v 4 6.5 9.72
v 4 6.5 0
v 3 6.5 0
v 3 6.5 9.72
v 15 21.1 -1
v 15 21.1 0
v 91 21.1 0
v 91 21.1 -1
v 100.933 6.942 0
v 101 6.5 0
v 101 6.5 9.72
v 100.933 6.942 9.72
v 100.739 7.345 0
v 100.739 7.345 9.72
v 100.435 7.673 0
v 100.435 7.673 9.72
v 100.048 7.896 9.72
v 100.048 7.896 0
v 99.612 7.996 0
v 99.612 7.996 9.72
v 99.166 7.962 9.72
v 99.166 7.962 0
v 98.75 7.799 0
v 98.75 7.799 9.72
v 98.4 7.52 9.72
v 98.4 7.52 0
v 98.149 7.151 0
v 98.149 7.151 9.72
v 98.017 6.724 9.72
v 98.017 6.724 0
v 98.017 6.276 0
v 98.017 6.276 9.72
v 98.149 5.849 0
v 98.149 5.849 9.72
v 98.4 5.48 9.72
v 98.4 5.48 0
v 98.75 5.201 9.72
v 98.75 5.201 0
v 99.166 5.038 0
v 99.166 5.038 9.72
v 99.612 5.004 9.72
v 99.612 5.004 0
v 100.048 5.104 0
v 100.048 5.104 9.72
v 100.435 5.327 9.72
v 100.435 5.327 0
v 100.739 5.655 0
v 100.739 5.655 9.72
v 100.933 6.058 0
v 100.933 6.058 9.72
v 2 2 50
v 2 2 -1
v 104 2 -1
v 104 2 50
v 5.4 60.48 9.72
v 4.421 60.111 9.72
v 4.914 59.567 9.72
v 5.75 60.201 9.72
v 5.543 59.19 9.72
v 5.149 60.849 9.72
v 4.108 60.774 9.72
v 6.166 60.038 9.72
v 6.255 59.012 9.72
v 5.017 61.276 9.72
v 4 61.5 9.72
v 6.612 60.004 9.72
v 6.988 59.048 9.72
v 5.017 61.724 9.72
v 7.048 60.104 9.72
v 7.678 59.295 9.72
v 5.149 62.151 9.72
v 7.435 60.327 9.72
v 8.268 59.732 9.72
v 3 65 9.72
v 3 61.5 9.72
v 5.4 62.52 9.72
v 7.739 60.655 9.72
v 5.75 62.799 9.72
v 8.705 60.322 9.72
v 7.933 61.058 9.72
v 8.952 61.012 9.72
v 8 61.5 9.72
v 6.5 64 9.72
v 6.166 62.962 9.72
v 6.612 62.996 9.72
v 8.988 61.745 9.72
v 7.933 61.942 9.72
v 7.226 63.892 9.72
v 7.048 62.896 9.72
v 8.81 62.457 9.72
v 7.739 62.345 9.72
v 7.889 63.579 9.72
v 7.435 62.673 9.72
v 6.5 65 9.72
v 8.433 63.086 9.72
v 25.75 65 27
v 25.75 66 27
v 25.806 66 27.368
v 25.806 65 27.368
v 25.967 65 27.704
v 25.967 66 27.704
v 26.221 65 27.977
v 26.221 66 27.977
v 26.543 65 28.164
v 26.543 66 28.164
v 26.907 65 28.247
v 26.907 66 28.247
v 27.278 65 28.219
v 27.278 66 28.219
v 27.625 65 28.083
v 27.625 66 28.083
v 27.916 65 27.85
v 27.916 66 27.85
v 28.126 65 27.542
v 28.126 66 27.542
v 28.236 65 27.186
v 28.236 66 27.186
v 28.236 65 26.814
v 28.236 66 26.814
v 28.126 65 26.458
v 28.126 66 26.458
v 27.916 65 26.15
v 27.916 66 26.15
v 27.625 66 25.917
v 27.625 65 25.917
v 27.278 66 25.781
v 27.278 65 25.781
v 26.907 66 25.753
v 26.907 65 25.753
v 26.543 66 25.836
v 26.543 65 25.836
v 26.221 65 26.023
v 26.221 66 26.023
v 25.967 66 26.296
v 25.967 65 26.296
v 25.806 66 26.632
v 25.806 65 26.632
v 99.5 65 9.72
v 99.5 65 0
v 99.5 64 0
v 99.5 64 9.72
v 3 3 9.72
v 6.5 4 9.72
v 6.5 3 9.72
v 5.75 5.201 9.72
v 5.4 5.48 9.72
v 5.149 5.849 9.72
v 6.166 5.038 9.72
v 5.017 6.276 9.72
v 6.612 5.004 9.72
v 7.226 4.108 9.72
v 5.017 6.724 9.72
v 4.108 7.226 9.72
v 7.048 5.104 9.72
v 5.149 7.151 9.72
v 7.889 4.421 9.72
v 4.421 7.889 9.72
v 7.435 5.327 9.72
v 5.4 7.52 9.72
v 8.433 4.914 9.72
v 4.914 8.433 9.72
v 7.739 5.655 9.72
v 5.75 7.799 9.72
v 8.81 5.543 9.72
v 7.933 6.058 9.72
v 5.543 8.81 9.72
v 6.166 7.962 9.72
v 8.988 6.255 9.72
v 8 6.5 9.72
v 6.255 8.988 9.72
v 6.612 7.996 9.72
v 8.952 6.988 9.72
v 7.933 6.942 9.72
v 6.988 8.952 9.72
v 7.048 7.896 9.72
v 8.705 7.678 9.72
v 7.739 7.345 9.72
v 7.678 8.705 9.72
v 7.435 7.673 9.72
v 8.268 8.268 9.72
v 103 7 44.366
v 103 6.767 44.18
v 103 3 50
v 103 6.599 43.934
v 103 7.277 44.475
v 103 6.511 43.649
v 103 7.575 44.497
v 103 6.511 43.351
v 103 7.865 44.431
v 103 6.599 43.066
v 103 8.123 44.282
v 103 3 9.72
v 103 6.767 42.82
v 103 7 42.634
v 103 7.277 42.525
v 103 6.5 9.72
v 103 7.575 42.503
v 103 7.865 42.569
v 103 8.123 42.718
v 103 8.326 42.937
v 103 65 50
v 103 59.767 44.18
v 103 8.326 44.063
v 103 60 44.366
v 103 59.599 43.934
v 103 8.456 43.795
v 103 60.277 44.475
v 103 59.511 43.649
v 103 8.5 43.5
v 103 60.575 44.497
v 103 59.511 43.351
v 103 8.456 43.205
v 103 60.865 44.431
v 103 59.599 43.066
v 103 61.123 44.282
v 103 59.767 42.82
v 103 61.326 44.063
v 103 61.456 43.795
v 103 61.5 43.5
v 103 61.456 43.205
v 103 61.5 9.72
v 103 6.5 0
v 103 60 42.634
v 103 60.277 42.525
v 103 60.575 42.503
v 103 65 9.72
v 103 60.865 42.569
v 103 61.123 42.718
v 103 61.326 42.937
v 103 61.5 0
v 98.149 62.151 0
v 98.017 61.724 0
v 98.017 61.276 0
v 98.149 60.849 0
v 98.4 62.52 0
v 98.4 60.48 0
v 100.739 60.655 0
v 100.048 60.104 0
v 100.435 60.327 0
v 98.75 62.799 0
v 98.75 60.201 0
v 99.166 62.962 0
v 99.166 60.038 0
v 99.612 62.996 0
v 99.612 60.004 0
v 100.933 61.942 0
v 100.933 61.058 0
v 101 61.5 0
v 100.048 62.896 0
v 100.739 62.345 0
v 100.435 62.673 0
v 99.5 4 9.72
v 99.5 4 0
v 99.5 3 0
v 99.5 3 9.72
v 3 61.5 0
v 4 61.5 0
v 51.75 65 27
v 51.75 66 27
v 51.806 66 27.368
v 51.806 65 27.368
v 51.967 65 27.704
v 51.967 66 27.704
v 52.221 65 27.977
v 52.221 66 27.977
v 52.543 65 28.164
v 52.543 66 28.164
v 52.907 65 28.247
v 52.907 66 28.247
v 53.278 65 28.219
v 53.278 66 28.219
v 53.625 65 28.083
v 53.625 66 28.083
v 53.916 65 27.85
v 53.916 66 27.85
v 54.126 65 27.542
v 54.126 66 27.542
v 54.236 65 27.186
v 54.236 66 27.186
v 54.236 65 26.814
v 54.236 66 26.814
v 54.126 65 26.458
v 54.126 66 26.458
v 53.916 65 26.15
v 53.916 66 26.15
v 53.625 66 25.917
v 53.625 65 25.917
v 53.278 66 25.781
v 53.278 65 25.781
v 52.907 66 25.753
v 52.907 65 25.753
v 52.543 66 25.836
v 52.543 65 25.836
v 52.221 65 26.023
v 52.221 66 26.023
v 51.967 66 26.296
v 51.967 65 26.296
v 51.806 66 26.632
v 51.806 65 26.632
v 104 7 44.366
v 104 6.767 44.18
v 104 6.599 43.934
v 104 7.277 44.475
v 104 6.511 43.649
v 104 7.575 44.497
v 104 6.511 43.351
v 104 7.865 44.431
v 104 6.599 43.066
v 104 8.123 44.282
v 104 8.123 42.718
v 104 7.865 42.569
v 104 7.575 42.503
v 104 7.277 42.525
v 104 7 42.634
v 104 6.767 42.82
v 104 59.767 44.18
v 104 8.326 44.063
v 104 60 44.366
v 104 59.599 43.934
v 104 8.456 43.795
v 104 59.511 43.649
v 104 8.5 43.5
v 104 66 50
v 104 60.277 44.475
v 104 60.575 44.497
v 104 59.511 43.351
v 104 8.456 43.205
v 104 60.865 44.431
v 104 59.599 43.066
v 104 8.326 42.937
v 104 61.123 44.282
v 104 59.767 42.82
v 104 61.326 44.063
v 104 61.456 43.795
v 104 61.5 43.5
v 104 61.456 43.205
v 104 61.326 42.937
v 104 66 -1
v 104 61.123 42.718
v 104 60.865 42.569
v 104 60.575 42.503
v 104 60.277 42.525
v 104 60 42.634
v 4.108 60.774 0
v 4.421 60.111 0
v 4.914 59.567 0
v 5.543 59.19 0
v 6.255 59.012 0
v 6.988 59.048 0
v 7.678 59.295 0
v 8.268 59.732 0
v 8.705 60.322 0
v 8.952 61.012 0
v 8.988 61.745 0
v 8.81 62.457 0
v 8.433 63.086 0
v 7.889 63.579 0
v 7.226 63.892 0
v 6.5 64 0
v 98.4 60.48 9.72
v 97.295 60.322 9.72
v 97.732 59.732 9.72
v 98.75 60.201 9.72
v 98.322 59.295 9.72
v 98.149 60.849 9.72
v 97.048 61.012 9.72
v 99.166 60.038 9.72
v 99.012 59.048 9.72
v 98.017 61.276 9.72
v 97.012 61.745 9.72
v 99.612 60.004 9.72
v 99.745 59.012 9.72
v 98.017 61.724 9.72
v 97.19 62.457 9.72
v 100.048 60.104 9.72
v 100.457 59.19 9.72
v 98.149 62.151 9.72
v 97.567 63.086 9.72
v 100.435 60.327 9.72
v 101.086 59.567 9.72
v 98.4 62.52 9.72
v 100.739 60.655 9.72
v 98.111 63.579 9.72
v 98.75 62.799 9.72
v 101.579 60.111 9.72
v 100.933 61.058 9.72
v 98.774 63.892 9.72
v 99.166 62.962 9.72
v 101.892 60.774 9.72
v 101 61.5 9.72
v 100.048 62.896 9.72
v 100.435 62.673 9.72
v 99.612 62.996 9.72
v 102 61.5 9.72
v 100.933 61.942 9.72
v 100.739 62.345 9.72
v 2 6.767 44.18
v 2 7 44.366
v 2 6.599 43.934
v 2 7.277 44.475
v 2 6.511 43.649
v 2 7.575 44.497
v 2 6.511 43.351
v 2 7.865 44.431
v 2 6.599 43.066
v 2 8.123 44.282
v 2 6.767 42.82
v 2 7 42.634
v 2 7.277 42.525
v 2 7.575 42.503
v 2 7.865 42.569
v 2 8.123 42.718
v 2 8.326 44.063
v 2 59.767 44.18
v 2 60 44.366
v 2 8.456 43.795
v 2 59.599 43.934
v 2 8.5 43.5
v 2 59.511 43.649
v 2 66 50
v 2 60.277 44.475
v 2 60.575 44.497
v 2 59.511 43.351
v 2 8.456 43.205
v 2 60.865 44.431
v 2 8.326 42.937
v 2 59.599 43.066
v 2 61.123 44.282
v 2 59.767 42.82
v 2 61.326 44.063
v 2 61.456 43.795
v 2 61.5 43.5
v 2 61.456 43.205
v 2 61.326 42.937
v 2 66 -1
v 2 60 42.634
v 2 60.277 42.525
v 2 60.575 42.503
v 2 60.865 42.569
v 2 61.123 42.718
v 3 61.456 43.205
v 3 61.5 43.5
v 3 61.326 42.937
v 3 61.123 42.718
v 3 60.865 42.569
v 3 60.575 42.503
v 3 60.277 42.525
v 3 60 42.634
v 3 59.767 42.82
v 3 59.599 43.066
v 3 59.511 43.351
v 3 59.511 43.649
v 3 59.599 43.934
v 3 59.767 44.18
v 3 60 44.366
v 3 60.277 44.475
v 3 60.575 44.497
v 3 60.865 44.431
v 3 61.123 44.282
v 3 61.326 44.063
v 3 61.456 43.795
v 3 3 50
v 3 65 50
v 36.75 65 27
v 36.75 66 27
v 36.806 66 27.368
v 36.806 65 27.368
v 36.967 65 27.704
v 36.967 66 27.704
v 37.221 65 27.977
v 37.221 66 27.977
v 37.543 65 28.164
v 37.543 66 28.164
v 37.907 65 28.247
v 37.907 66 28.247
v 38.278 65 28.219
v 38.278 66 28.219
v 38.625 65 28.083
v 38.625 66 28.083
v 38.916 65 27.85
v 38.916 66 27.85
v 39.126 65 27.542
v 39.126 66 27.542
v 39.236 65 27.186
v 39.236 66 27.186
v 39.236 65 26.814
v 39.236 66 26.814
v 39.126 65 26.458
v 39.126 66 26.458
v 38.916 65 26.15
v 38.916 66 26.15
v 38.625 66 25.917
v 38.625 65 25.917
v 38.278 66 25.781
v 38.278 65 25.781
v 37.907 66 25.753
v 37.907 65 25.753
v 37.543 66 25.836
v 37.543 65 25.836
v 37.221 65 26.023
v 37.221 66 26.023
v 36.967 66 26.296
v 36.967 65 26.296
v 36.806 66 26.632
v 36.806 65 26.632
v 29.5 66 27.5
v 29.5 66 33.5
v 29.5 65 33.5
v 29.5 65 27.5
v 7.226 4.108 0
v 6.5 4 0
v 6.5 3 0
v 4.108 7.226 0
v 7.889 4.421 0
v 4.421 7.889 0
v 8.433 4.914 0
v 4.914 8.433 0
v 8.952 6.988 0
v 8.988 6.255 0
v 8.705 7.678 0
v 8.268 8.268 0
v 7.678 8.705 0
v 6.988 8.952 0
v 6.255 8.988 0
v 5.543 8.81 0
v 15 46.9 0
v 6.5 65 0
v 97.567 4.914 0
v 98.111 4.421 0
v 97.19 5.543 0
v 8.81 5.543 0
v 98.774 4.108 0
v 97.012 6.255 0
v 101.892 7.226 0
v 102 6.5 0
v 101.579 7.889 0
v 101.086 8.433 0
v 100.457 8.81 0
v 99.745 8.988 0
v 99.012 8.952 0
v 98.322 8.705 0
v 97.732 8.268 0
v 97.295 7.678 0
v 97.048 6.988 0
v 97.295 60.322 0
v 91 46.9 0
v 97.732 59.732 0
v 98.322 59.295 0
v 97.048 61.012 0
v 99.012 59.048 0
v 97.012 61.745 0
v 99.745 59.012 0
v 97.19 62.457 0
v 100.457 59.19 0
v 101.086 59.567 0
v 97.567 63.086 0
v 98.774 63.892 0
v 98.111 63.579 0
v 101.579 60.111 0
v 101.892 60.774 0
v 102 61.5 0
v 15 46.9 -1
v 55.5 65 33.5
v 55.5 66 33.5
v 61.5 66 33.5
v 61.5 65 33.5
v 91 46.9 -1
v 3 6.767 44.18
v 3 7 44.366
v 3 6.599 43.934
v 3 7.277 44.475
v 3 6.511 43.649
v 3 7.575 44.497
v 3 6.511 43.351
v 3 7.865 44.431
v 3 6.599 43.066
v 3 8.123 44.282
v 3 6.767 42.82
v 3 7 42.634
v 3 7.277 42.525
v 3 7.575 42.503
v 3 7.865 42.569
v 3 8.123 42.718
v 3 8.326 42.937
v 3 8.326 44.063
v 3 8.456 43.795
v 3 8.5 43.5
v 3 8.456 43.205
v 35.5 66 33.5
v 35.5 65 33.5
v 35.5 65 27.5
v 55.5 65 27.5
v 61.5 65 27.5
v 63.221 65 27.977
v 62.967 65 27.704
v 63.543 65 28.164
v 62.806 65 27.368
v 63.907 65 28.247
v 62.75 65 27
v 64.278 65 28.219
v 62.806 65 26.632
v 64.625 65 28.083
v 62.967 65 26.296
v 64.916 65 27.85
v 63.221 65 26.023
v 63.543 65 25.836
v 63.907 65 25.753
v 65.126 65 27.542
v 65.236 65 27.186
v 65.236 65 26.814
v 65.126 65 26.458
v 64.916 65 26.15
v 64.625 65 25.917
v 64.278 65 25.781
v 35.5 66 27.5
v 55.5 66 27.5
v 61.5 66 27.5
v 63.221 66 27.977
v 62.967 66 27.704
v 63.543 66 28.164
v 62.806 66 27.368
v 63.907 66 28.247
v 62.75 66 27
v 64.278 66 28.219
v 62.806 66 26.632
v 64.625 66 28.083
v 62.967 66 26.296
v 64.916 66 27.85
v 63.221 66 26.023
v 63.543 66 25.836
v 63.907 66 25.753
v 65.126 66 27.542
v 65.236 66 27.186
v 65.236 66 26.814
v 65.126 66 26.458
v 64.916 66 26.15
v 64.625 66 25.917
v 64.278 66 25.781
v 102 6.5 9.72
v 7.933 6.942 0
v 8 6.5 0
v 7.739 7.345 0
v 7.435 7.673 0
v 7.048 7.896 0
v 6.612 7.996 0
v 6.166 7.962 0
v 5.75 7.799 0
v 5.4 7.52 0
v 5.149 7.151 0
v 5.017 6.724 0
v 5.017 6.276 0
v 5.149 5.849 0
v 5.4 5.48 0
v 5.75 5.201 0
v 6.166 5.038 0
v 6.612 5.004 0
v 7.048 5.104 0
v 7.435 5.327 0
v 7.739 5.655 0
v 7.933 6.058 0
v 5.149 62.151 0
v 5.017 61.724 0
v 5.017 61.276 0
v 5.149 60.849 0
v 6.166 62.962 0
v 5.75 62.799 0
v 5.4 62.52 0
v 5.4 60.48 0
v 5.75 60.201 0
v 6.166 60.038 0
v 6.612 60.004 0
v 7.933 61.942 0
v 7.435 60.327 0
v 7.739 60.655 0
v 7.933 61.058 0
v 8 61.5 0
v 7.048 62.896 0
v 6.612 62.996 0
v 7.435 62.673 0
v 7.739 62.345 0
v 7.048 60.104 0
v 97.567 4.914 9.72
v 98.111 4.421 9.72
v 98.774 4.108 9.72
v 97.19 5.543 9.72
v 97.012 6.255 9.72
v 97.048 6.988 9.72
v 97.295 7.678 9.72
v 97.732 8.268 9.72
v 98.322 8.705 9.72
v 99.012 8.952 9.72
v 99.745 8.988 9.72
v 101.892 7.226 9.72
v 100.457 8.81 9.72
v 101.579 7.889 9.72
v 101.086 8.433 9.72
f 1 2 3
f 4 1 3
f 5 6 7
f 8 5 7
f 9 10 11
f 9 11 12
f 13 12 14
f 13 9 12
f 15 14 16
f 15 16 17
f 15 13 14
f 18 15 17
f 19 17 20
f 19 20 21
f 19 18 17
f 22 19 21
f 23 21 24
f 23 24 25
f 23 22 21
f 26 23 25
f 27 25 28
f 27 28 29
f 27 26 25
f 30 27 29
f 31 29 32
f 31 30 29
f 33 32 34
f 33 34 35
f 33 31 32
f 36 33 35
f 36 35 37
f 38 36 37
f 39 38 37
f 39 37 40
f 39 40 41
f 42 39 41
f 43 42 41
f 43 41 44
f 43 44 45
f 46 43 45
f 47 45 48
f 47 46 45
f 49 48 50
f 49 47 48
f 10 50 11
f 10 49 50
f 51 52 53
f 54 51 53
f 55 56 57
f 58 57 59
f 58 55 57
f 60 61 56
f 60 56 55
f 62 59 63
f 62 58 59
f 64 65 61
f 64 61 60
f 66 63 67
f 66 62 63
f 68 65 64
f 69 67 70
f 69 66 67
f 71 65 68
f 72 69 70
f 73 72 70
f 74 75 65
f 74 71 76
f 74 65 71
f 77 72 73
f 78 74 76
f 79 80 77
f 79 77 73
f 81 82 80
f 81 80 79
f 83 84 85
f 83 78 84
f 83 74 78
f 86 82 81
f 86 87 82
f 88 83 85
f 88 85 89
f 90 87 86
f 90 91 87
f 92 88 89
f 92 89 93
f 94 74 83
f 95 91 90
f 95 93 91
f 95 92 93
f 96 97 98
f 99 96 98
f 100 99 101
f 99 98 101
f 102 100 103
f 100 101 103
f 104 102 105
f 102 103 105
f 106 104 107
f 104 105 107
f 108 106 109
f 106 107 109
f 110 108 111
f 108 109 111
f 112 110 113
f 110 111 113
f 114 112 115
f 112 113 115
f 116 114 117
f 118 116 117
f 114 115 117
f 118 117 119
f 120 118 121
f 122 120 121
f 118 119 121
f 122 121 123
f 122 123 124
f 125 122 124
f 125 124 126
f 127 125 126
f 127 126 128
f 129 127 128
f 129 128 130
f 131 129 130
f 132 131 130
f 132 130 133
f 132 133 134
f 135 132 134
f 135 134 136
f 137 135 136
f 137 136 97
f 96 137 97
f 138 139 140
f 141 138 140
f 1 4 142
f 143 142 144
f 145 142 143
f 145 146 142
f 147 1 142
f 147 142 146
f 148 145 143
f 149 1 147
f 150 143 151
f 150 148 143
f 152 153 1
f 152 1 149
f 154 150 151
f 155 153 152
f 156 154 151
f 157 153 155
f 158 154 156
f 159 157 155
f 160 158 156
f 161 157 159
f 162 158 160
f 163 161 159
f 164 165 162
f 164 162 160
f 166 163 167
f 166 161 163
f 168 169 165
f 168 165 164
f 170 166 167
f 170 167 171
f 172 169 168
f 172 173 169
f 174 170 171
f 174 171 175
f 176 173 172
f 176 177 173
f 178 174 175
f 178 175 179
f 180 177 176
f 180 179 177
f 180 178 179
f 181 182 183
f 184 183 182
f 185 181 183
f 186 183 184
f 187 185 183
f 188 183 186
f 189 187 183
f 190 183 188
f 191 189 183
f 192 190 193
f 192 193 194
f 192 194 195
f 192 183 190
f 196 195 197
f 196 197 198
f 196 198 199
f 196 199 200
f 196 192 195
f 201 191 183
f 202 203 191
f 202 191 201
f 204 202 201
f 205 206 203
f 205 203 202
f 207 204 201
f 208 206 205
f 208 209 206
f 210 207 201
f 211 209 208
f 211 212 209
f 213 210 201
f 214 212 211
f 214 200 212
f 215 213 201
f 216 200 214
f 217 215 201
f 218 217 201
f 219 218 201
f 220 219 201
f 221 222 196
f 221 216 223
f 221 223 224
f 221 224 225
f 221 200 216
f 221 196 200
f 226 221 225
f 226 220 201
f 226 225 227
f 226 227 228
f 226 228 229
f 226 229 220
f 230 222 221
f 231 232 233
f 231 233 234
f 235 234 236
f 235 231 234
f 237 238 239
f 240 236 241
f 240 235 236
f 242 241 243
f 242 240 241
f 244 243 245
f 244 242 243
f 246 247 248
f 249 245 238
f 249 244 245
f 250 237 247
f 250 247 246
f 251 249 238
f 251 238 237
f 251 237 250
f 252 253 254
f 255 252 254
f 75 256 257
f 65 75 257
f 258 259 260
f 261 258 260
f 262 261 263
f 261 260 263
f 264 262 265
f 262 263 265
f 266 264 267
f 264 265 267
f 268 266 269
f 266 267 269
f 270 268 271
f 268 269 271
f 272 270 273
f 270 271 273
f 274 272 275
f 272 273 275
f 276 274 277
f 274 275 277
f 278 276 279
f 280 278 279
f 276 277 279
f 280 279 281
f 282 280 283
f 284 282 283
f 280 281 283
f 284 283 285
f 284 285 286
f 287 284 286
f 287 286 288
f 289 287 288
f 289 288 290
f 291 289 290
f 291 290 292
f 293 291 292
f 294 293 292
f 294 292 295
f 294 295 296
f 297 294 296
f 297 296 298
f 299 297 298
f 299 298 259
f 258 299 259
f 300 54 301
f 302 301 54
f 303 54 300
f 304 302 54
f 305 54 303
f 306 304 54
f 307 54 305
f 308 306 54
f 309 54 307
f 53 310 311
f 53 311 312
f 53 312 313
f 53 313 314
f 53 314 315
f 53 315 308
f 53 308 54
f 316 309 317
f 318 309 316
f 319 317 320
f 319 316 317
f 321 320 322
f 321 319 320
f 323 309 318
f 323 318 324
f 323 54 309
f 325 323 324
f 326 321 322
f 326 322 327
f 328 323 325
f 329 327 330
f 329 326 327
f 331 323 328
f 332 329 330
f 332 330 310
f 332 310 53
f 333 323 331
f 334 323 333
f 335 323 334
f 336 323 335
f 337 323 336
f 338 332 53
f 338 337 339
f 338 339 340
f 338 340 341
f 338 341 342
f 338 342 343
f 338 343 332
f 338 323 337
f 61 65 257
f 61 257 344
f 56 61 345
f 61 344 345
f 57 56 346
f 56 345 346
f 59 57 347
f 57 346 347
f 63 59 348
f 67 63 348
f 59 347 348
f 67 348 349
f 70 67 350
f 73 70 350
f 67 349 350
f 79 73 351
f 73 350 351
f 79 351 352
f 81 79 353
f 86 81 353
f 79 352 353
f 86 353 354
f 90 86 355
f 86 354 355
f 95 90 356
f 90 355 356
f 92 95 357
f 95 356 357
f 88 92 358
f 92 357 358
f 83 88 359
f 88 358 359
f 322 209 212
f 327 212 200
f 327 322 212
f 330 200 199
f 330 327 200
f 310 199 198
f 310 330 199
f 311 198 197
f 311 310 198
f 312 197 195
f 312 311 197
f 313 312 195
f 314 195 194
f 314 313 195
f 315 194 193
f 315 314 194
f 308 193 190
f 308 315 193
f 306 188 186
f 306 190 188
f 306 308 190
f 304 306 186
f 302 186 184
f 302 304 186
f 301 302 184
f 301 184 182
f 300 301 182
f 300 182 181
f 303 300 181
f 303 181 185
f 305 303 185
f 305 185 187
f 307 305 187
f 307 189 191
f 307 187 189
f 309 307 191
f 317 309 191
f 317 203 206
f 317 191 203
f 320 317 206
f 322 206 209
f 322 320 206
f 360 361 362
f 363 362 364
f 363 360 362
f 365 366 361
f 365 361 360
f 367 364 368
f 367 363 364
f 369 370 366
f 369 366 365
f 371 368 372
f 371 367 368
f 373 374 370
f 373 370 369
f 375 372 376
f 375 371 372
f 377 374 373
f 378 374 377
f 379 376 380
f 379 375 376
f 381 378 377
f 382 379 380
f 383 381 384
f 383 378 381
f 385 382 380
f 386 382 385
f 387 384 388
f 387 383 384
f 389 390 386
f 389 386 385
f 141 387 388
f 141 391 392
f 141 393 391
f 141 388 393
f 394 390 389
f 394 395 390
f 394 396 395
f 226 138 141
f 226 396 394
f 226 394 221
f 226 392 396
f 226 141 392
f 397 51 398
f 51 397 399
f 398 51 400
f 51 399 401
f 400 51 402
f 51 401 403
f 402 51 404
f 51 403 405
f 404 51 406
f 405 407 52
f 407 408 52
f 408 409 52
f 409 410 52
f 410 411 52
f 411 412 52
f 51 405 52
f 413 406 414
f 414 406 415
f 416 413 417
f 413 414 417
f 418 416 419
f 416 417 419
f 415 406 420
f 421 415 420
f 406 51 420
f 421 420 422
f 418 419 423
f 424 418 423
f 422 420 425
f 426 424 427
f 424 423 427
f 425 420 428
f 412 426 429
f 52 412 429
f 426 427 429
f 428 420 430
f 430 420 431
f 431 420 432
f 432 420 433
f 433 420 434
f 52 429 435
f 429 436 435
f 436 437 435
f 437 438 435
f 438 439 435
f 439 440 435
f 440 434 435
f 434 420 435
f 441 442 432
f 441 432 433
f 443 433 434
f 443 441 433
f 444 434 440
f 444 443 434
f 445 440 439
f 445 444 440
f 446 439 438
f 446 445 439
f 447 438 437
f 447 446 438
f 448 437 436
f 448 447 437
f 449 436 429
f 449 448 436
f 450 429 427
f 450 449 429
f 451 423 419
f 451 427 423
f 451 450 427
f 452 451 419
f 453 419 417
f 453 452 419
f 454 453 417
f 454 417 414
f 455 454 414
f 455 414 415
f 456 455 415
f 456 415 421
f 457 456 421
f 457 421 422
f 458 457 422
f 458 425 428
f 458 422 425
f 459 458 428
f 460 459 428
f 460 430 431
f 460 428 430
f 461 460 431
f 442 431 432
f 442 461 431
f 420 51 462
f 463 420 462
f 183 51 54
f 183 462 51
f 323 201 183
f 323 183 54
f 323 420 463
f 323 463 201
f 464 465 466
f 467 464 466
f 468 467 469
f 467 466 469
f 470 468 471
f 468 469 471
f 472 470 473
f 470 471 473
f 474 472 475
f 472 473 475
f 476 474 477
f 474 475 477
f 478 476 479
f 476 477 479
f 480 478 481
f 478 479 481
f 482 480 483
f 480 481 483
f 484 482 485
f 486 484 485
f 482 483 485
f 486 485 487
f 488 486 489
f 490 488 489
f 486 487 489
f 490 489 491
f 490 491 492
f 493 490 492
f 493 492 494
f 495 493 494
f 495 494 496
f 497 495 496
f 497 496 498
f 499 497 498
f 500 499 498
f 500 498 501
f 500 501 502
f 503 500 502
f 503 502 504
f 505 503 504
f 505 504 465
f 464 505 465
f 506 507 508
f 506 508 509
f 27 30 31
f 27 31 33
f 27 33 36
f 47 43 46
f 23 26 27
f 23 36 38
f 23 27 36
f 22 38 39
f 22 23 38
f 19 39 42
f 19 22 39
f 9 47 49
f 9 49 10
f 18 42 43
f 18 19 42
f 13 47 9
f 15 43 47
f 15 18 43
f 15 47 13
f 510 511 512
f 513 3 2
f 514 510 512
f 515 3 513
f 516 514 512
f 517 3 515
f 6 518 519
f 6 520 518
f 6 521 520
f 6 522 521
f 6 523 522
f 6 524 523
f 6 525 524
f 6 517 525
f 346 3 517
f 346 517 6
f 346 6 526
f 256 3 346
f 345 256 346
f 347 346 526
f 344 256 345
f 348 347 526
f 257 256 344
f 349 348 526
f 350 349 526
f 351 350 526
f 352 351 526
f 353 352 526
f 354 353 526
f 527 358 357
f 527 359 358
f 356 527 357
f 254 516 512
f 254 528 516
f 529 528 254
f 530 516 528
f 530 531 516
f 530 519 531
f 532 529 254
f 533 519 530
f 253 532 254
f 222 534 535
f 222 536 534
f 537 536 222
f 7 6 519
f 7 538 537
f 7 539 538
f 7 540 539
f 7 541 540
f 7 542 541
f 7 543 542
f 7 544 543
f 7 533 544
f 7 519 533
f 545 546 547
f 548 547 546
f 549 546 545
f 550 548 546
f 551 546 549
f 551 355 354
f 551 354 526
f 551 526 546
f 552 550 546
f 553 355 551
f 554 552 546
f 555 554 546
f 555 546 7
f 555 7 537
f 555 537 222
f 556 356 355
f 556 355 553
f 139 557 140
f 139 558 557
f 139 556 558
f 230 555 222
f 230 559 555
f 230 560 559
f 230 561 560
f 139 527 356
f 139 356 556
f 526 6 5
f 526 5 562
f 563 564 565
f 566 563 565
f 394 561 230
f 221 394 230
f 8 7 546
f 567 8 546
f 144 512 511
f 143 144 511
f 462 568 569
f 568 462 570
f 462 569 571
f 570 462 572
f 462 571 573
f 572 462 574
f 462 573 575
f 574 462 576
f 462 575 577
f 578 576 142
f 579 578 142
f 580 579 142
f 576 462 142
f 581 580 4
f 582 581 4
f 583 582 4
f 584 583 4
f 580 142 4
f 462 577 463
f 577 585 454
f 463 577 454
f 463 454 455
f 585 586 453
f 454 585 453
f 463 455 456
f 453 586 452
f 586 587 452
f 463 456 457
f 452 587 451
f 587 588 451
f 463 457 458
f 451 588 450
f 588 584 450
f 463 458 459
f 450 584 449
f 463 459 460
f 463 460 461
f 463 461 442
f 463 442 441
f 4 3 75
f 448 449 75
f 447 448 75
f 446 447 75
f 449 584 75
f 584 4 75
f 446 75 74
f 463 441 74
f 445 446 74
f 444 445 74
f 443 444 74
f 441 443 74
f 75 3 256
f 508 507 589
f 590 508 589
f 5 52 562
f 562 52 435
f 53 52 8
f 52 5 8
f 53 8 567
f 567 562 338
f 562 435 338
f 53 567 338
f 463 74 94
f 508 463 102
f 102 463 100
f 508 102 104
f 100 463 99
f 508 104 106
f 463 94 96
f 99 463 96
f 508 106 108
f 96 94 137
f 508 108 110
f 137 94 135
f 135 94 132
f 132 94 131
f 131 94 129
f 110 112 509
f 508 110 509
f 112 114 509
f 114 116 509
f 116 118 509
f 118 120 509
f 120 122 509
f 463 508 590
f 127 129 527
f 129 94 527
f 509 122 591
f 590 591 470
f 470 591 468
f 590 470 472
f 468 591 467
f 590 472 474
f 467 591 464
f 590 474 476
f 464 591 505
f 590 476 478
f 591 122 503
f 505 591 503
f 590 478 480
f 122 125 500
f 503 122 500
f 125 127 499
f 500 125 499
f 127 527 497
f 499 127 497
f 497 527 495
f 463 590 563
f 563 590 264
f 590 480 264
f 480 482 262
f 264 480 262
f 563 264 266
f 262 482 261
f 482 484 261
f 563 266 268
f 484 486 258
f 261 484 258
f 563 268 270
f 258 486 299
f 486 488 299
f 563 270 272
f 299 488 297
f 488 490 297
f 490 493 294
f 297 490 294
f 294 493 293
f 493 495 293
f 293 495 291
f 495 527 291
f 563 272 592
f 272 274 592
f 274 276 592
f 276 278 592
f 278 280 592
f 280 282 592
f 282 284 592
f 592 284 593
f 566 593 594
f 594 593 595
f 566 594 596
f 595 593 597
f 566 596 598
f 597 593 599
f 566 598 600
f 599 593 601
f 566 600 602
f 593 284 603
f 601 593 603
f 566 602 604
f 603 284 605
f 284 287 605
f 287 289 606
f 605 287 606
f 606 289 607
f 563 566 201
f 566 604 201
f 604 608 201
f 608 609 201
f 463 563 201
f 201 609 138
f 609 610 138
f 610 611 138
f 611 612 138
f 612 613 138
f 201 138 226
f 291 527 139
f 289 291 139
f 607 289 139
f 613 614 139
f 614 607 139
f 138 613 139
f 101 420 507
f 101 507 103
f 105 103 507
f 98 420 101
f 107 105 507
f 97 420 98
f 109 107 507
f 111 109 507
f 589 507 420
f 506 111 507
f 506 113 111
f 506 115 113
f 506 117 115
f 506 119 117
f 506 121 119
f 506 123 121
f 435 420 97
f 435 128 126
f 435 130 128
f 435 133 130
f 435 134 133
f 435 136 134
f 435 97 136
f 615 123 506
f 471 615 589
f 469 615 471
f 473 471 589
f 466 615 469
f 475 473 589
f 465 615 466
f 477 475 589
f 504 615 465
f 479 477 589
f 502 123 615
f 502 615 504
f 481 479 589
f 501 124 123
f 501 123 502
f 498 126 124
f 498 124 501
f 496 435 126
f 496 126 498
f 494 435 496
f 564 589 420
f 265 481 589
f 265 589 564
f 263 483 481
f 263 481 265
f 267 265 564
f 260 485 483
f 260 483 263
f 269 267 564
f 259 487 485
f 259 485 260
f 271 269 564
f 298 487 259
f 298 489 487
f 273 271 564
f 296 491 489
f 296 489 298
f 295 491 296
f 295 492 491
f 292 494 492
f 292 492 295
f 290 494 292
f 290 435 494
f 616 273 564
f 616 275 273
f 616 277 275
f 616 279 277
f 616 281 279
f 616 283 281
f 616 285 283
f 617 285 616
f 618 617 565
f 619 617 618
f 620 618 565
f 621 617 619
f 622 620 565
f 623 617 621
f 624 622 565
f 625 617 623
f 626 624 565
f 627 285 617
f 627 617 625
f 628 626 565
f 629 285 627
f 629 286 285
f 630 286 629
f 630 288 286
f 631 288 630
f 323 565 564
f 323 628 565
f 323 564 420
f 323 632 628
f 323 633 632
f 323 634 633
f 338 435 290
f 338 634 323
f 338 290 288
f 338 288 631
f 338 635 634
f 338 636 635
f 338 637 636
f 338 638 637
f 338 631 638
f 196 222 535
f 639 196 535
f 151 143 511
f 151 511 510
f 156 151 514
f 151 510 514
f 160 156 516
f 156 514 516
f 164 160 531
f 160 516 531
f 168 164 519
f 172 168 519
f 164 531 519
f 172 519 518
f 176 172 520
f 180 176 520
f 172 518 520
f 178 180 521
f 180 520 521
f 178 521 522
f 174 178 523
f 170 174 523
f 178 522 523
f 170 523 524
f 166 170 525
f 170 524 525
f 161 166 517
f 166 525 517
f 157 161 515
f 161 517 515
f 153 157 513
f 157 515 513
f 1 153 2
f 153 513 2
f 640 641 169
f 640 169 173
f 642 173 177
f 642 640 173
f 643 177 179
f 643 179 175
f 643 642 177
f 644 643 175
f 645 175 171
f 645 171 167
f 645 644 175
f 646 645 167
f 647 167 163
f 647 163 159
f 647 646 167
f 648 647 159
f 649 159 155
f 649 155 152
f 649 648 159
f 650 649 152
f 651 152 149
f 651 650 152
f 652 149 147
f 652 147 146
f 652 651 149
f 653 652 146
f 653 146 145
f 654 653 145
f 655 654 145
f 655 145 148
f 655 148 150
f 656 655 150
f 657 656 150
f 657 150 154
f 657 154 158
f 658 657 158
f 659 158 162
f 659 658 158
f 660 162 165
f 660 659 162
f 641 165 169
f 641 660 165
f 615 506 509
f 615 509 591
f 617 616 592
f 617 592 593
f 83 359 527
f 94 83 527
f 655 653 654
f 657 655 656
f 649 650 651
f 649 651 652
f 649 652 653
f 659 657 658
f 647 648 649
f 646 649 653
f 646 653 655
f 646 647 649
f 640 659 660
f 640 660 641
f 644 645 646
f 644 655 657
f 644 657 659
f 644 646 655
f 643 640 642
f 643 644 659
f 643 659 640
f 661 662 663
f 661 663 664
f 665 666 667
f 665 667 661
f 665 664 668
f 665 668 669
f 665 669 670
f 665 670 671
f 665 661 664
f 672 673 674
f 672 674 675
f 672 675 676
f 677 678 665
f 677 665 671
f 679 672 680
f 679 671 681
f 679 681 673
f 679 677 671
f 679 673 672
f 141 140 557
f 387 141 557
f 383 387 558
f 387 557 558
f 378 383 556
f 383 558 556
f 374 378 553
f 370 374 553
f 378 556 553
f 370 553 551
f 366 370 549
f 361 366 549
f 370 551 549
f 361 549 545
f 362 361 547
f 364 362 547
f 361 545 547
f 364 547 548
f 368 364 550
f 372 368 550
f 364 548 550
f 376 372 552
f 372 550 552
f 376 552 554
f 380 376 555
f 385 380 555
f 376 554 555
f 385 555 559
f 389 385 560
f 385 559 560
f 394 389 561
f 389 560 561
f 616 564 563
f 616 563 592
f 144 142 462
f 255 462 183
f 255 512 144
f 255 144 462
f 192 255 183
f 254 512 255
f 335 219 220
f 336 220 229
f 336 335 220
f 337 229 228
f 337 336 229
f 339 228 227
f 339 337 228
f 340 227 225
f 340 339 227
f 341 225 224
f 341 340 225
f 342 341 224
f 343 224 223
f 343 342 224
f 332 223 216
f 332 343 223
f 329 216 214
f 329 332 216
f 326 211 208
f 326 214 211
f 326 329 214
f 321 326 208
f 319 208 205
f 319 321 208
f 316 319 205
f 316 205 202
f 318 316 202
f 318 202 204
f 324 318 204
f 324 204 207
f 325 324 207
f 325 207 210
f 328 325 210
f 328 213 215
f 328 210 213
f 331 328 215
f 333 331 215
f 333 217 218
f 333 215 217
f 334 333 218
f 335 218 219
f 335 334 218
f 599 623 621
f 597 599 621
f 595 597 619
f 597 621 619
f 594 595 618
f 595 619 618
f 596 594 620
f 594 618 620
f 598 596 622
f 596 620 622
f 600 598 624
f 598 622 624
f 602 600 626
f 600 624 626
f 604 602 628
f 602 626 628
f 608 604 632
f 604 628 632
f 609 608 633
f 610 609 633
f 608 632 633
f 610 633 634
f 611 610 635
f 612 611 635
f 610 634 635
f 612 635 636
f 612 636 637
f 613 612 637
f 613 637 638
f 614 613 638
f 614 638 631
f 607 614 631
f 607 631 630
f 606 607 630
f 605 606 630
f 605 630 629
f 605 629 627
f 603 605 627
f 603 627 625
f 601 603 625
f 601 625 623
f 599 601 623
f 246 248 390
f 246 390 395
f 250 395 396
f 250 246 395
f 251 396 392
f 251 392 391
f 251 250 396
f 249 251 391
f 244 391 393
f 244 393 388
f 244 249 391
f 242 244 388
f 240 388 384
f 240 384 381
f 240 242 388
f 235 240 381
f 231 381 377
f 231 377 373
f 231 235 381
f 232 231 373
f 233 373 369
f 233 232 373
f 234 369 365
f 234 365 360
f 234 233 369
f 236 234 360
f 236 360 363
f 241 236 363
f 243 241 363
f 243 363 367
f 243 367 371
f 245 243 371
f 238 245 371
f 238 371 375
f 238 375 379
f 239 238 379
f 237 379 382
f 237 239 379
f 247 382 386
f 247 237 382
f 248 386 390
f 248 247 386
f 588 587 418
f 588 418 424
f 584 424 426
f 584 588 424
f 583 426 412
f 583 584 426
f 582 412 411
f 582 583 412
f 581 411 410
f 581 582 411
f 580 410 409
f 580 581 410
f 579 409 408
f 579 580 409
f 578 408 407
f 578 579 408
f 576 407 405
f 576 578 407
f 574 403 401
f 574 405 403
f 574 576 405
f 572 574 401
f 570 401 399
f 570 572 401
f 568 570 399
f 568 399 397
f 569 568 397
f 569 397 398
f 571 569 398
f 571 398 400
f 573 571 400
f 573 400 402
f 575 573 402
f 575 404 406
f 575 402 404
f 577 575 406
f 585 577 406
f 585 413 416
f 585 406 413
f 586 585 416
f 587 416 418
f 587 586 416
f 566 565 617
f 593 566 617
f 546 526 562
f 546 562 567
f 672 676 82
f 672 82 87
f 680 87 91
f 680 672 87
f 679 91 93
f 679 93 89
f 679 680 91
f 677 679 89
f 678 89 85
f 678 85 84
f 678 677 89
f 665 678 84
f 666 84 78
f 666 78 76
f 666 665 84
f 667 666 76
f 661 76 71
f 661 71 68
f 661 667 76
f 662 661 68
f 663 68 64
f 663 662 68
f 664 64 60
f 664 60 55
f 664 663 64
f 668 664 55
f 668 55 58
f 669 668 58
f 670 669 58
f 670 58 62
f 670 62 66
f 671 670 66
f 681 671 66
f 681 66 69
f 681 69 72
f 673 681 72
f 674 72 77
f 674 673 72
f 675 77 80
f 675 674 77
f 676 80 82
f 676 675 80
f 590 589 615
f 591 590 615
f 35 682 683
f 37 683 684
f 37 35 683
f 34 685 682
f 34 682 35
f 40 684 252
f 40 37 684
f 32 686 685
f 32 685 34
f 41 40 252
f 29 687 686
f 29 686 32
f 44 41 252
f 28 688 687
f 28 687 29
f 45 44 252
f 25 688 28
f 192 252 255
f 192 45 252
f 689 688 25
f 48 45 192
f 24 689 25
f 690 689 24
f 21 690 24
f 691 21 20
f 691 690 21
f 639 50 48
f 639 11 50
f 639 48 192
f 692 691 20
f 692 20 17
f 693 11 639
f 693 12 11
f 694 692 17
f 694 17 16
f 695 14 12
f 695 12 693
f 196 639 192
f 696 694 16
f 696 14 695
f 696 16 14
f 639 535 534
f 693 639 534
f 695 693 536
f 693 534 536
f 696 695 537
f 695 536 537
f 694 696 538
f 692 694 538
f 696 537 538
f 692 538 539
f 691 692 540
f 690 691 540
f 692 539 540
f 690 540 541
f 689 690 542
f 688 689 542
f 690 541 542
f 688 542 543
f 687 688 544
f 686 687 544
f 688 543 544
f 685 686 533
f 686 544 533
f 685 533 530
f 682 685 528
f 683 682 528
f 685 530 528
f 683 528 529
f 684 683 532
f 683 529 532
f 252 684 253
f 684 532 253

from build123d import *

# Parameters (mm, degrees)
SKETCH_1_W               = 102
SKETCH_1_H               = 64
EXTRUDE_1_DEPTH          = 50
SKETCH_1_3_R             = 1.5
EXTRUDE_2_DEPTH          = 9.72
SKETCH_4_W               = 102
SKETCH_4_H               = 1
EXTRUDE_3_DEPTH          = 64
SKETCH_1_5_W             = 76
SKETCH_1_5_H             = 25.8
CUT_EXTRUDE_1_DEPTH      = 1
CUT_EXTRUDE_2_DEPTH      = 102
CUT_EXTRUDE_2_DEPTH_BACK = 1
SKETCH_5_R               = 1
SKETCH_6_R               = 1.25
SKETCH_6_W               = 6
SKETCH_6_H               = 6
CUT_EXTRUDE_3_DEPTH      = 10


with BuildPart() as part:
    # Эскиз1 → Бобышка-Вытянуть1 (new body)
    with BuildSketch(Plane.XY):
        with Locations((53, 34)):
            Rectangle(SKETCH_1_W, SKETCH_1_H)
        Polygon((3, 61.5), (3, 65), (6.5, 65), (99.5, 65), (103, 65), (103, 61.5), (103, 6.5), (103, 3), (99.5, 3), (6.5, 3), (3, 3), (3, 6.5), align=None, mode=Mode.SUBTRACT)
    extrude(amount=EXTRUDE_1_DEPTH)

    # Эскиз1<3> → Бобышка-Вытянуть2 (add)
    # profile 1 of 4: a face of its own
    with BuildSketch(Plane.XY):
        with BuildLine():
            Line((6.5, 65), (3, 65))
            Line((3, 65), (3, 61.5))
            Line((3, 61.5), (4, 61.5))
            ThreePointArc((4, 61.5), (8.267766953, 59.732233047), (6.5, 64))
            Line((6.5, 64), (6.5, 65))
        make_face()
        with Locations((6.5, 61.5)):
            Circle(SKETCH_1_3_R, mode=Mode.SUBTRACT)
    # profile 2 of 4: a face of its own
    with BuildSketch(Plane.XY):
        with BuildLine():
            Line((103, 65), (99.5, 65))
            Line((99.5, 65), (99.5, 64))
            ThreePointArc((99.5, 64), (97.732233047, 59.732233047), (102, 61.5))
            Line((102, 61.5), (103, 61.5))
            Line((103, 61.5), (103, 65))
        make_face()
        with Locations((99.5, 61.5)):
            Circle(SKETCH_1_3_R, mode=Mode.SUBTRACT)
    # profile 3 of 4: a face of its own
    with BuildSketch(Plane.XY):
        with BuildLine():
            Line((4, 6.5), (3, 6.5))
            Line((3, 6.5), (3, 3))
            Line((3, 3), (6.5, 3))
            Line((6.5, 3), (6.5, 4))
            ThreePointArc((6.5, 4), (8.267766953, 8.267766953), (4, 6.5))
        make_face()
        with Locations((6.5, 6.5)):
            Circle(SKETCH_1_3_R, mode=Mode.SUBTRACT)
    # profile 4 of 4: a face of its own
    with BuildSketch(Plane.XY):
        with BuildLine():
            Line((103, 3), (103, 6.5))
            Line((103, 6.5), (102, 6.5))
            ThreePointArc((102, 6.5), (97.732233047, 8.267766953), (99.5, 4))
            Line((99.5, 4), (99.5, 3))
            Line((99.5, 3), (103, 3))
        make_face()
        with Locations((99.5, 6.5)):
            Circle(SKETCH_1_3_R, mode=Mode.SUBTRACT)
    extrude(amount=EXTRUDE_2_DEPTH)

    # Эскиз4 → Бобышка-Вытянуть3 (add)
    with BuildSketch(Plane(origin=(0, 66, 0), x_dir=(1, 0, 0), z_dir=(0, 1, 0))):
        with Locations((53, 0.5)):
            Rectangle(SKETCH_4_W, SKETCH_4_H)
    extrude(amount=-EXTRUDE_3_DEPTH)

    # Эскиз1<5> → Вырез-Вытянуть1 (cut)
    with BuildSketch(Plane.XY):
        with Locations((53, 34)):
            Rectangle(SKETCH_1_5_W, SKETCH_1_5_H)
    extrude(amount=-CUT_EXTRUDE_1_DEPTH, mode=Mode.SUBTRACT)

    # Эскиз5 → Вырез-Вытянуть2 (cut, two sides: drawn at the far end of the back side and taken through both)
    with BuildSketch(Plane.ZY.offset(-103).offset(-CUT_EXTRUDE_2_DEPTH_BACK)):
        with Locations((43.5, 7.5)):
            Circle(SKETCH_5_R)
        with Locations((43.5, 60.5)):
            Circle(SKETCH_5_R)
    extrude(amount=CUT_EXTRUDE_2_DEPTH + CUT_EXTRUDE_2_DEPTH_BACK, mode=Mode.SUBTRACT)

    # Эскиз6 → Вырез-Вытянуть3 (cut)
    with BuildSketch(Plane(origin=(0, 66, 0), x_dir=(1, 0, 0), z_dir=(0, 1, 0))):
        with Locations((27, -27)):
            Circle(SKETCH_6_R)
        with Locations((38, -27)):
            Circle(SKETCH_6_R)
        with Locations((53, -27)):
            Circle(SKETCH_6_R)
        with Locations((64, -27)):
            Circle(SKETCH_6_R)
        with Locations((32.5, -30.5)):
            Rectangle(SKETCH_6_W, SKETCH_6_H)
        with Locations((58.5, -30.5)):
            Rectangle(SKETCH_6_W, SKETCH_6_H)
    extrude(amount=-CUT_EXTRUDE_3_DEPTH, mode=Mode.SUBTRACT)


solid = part.part
